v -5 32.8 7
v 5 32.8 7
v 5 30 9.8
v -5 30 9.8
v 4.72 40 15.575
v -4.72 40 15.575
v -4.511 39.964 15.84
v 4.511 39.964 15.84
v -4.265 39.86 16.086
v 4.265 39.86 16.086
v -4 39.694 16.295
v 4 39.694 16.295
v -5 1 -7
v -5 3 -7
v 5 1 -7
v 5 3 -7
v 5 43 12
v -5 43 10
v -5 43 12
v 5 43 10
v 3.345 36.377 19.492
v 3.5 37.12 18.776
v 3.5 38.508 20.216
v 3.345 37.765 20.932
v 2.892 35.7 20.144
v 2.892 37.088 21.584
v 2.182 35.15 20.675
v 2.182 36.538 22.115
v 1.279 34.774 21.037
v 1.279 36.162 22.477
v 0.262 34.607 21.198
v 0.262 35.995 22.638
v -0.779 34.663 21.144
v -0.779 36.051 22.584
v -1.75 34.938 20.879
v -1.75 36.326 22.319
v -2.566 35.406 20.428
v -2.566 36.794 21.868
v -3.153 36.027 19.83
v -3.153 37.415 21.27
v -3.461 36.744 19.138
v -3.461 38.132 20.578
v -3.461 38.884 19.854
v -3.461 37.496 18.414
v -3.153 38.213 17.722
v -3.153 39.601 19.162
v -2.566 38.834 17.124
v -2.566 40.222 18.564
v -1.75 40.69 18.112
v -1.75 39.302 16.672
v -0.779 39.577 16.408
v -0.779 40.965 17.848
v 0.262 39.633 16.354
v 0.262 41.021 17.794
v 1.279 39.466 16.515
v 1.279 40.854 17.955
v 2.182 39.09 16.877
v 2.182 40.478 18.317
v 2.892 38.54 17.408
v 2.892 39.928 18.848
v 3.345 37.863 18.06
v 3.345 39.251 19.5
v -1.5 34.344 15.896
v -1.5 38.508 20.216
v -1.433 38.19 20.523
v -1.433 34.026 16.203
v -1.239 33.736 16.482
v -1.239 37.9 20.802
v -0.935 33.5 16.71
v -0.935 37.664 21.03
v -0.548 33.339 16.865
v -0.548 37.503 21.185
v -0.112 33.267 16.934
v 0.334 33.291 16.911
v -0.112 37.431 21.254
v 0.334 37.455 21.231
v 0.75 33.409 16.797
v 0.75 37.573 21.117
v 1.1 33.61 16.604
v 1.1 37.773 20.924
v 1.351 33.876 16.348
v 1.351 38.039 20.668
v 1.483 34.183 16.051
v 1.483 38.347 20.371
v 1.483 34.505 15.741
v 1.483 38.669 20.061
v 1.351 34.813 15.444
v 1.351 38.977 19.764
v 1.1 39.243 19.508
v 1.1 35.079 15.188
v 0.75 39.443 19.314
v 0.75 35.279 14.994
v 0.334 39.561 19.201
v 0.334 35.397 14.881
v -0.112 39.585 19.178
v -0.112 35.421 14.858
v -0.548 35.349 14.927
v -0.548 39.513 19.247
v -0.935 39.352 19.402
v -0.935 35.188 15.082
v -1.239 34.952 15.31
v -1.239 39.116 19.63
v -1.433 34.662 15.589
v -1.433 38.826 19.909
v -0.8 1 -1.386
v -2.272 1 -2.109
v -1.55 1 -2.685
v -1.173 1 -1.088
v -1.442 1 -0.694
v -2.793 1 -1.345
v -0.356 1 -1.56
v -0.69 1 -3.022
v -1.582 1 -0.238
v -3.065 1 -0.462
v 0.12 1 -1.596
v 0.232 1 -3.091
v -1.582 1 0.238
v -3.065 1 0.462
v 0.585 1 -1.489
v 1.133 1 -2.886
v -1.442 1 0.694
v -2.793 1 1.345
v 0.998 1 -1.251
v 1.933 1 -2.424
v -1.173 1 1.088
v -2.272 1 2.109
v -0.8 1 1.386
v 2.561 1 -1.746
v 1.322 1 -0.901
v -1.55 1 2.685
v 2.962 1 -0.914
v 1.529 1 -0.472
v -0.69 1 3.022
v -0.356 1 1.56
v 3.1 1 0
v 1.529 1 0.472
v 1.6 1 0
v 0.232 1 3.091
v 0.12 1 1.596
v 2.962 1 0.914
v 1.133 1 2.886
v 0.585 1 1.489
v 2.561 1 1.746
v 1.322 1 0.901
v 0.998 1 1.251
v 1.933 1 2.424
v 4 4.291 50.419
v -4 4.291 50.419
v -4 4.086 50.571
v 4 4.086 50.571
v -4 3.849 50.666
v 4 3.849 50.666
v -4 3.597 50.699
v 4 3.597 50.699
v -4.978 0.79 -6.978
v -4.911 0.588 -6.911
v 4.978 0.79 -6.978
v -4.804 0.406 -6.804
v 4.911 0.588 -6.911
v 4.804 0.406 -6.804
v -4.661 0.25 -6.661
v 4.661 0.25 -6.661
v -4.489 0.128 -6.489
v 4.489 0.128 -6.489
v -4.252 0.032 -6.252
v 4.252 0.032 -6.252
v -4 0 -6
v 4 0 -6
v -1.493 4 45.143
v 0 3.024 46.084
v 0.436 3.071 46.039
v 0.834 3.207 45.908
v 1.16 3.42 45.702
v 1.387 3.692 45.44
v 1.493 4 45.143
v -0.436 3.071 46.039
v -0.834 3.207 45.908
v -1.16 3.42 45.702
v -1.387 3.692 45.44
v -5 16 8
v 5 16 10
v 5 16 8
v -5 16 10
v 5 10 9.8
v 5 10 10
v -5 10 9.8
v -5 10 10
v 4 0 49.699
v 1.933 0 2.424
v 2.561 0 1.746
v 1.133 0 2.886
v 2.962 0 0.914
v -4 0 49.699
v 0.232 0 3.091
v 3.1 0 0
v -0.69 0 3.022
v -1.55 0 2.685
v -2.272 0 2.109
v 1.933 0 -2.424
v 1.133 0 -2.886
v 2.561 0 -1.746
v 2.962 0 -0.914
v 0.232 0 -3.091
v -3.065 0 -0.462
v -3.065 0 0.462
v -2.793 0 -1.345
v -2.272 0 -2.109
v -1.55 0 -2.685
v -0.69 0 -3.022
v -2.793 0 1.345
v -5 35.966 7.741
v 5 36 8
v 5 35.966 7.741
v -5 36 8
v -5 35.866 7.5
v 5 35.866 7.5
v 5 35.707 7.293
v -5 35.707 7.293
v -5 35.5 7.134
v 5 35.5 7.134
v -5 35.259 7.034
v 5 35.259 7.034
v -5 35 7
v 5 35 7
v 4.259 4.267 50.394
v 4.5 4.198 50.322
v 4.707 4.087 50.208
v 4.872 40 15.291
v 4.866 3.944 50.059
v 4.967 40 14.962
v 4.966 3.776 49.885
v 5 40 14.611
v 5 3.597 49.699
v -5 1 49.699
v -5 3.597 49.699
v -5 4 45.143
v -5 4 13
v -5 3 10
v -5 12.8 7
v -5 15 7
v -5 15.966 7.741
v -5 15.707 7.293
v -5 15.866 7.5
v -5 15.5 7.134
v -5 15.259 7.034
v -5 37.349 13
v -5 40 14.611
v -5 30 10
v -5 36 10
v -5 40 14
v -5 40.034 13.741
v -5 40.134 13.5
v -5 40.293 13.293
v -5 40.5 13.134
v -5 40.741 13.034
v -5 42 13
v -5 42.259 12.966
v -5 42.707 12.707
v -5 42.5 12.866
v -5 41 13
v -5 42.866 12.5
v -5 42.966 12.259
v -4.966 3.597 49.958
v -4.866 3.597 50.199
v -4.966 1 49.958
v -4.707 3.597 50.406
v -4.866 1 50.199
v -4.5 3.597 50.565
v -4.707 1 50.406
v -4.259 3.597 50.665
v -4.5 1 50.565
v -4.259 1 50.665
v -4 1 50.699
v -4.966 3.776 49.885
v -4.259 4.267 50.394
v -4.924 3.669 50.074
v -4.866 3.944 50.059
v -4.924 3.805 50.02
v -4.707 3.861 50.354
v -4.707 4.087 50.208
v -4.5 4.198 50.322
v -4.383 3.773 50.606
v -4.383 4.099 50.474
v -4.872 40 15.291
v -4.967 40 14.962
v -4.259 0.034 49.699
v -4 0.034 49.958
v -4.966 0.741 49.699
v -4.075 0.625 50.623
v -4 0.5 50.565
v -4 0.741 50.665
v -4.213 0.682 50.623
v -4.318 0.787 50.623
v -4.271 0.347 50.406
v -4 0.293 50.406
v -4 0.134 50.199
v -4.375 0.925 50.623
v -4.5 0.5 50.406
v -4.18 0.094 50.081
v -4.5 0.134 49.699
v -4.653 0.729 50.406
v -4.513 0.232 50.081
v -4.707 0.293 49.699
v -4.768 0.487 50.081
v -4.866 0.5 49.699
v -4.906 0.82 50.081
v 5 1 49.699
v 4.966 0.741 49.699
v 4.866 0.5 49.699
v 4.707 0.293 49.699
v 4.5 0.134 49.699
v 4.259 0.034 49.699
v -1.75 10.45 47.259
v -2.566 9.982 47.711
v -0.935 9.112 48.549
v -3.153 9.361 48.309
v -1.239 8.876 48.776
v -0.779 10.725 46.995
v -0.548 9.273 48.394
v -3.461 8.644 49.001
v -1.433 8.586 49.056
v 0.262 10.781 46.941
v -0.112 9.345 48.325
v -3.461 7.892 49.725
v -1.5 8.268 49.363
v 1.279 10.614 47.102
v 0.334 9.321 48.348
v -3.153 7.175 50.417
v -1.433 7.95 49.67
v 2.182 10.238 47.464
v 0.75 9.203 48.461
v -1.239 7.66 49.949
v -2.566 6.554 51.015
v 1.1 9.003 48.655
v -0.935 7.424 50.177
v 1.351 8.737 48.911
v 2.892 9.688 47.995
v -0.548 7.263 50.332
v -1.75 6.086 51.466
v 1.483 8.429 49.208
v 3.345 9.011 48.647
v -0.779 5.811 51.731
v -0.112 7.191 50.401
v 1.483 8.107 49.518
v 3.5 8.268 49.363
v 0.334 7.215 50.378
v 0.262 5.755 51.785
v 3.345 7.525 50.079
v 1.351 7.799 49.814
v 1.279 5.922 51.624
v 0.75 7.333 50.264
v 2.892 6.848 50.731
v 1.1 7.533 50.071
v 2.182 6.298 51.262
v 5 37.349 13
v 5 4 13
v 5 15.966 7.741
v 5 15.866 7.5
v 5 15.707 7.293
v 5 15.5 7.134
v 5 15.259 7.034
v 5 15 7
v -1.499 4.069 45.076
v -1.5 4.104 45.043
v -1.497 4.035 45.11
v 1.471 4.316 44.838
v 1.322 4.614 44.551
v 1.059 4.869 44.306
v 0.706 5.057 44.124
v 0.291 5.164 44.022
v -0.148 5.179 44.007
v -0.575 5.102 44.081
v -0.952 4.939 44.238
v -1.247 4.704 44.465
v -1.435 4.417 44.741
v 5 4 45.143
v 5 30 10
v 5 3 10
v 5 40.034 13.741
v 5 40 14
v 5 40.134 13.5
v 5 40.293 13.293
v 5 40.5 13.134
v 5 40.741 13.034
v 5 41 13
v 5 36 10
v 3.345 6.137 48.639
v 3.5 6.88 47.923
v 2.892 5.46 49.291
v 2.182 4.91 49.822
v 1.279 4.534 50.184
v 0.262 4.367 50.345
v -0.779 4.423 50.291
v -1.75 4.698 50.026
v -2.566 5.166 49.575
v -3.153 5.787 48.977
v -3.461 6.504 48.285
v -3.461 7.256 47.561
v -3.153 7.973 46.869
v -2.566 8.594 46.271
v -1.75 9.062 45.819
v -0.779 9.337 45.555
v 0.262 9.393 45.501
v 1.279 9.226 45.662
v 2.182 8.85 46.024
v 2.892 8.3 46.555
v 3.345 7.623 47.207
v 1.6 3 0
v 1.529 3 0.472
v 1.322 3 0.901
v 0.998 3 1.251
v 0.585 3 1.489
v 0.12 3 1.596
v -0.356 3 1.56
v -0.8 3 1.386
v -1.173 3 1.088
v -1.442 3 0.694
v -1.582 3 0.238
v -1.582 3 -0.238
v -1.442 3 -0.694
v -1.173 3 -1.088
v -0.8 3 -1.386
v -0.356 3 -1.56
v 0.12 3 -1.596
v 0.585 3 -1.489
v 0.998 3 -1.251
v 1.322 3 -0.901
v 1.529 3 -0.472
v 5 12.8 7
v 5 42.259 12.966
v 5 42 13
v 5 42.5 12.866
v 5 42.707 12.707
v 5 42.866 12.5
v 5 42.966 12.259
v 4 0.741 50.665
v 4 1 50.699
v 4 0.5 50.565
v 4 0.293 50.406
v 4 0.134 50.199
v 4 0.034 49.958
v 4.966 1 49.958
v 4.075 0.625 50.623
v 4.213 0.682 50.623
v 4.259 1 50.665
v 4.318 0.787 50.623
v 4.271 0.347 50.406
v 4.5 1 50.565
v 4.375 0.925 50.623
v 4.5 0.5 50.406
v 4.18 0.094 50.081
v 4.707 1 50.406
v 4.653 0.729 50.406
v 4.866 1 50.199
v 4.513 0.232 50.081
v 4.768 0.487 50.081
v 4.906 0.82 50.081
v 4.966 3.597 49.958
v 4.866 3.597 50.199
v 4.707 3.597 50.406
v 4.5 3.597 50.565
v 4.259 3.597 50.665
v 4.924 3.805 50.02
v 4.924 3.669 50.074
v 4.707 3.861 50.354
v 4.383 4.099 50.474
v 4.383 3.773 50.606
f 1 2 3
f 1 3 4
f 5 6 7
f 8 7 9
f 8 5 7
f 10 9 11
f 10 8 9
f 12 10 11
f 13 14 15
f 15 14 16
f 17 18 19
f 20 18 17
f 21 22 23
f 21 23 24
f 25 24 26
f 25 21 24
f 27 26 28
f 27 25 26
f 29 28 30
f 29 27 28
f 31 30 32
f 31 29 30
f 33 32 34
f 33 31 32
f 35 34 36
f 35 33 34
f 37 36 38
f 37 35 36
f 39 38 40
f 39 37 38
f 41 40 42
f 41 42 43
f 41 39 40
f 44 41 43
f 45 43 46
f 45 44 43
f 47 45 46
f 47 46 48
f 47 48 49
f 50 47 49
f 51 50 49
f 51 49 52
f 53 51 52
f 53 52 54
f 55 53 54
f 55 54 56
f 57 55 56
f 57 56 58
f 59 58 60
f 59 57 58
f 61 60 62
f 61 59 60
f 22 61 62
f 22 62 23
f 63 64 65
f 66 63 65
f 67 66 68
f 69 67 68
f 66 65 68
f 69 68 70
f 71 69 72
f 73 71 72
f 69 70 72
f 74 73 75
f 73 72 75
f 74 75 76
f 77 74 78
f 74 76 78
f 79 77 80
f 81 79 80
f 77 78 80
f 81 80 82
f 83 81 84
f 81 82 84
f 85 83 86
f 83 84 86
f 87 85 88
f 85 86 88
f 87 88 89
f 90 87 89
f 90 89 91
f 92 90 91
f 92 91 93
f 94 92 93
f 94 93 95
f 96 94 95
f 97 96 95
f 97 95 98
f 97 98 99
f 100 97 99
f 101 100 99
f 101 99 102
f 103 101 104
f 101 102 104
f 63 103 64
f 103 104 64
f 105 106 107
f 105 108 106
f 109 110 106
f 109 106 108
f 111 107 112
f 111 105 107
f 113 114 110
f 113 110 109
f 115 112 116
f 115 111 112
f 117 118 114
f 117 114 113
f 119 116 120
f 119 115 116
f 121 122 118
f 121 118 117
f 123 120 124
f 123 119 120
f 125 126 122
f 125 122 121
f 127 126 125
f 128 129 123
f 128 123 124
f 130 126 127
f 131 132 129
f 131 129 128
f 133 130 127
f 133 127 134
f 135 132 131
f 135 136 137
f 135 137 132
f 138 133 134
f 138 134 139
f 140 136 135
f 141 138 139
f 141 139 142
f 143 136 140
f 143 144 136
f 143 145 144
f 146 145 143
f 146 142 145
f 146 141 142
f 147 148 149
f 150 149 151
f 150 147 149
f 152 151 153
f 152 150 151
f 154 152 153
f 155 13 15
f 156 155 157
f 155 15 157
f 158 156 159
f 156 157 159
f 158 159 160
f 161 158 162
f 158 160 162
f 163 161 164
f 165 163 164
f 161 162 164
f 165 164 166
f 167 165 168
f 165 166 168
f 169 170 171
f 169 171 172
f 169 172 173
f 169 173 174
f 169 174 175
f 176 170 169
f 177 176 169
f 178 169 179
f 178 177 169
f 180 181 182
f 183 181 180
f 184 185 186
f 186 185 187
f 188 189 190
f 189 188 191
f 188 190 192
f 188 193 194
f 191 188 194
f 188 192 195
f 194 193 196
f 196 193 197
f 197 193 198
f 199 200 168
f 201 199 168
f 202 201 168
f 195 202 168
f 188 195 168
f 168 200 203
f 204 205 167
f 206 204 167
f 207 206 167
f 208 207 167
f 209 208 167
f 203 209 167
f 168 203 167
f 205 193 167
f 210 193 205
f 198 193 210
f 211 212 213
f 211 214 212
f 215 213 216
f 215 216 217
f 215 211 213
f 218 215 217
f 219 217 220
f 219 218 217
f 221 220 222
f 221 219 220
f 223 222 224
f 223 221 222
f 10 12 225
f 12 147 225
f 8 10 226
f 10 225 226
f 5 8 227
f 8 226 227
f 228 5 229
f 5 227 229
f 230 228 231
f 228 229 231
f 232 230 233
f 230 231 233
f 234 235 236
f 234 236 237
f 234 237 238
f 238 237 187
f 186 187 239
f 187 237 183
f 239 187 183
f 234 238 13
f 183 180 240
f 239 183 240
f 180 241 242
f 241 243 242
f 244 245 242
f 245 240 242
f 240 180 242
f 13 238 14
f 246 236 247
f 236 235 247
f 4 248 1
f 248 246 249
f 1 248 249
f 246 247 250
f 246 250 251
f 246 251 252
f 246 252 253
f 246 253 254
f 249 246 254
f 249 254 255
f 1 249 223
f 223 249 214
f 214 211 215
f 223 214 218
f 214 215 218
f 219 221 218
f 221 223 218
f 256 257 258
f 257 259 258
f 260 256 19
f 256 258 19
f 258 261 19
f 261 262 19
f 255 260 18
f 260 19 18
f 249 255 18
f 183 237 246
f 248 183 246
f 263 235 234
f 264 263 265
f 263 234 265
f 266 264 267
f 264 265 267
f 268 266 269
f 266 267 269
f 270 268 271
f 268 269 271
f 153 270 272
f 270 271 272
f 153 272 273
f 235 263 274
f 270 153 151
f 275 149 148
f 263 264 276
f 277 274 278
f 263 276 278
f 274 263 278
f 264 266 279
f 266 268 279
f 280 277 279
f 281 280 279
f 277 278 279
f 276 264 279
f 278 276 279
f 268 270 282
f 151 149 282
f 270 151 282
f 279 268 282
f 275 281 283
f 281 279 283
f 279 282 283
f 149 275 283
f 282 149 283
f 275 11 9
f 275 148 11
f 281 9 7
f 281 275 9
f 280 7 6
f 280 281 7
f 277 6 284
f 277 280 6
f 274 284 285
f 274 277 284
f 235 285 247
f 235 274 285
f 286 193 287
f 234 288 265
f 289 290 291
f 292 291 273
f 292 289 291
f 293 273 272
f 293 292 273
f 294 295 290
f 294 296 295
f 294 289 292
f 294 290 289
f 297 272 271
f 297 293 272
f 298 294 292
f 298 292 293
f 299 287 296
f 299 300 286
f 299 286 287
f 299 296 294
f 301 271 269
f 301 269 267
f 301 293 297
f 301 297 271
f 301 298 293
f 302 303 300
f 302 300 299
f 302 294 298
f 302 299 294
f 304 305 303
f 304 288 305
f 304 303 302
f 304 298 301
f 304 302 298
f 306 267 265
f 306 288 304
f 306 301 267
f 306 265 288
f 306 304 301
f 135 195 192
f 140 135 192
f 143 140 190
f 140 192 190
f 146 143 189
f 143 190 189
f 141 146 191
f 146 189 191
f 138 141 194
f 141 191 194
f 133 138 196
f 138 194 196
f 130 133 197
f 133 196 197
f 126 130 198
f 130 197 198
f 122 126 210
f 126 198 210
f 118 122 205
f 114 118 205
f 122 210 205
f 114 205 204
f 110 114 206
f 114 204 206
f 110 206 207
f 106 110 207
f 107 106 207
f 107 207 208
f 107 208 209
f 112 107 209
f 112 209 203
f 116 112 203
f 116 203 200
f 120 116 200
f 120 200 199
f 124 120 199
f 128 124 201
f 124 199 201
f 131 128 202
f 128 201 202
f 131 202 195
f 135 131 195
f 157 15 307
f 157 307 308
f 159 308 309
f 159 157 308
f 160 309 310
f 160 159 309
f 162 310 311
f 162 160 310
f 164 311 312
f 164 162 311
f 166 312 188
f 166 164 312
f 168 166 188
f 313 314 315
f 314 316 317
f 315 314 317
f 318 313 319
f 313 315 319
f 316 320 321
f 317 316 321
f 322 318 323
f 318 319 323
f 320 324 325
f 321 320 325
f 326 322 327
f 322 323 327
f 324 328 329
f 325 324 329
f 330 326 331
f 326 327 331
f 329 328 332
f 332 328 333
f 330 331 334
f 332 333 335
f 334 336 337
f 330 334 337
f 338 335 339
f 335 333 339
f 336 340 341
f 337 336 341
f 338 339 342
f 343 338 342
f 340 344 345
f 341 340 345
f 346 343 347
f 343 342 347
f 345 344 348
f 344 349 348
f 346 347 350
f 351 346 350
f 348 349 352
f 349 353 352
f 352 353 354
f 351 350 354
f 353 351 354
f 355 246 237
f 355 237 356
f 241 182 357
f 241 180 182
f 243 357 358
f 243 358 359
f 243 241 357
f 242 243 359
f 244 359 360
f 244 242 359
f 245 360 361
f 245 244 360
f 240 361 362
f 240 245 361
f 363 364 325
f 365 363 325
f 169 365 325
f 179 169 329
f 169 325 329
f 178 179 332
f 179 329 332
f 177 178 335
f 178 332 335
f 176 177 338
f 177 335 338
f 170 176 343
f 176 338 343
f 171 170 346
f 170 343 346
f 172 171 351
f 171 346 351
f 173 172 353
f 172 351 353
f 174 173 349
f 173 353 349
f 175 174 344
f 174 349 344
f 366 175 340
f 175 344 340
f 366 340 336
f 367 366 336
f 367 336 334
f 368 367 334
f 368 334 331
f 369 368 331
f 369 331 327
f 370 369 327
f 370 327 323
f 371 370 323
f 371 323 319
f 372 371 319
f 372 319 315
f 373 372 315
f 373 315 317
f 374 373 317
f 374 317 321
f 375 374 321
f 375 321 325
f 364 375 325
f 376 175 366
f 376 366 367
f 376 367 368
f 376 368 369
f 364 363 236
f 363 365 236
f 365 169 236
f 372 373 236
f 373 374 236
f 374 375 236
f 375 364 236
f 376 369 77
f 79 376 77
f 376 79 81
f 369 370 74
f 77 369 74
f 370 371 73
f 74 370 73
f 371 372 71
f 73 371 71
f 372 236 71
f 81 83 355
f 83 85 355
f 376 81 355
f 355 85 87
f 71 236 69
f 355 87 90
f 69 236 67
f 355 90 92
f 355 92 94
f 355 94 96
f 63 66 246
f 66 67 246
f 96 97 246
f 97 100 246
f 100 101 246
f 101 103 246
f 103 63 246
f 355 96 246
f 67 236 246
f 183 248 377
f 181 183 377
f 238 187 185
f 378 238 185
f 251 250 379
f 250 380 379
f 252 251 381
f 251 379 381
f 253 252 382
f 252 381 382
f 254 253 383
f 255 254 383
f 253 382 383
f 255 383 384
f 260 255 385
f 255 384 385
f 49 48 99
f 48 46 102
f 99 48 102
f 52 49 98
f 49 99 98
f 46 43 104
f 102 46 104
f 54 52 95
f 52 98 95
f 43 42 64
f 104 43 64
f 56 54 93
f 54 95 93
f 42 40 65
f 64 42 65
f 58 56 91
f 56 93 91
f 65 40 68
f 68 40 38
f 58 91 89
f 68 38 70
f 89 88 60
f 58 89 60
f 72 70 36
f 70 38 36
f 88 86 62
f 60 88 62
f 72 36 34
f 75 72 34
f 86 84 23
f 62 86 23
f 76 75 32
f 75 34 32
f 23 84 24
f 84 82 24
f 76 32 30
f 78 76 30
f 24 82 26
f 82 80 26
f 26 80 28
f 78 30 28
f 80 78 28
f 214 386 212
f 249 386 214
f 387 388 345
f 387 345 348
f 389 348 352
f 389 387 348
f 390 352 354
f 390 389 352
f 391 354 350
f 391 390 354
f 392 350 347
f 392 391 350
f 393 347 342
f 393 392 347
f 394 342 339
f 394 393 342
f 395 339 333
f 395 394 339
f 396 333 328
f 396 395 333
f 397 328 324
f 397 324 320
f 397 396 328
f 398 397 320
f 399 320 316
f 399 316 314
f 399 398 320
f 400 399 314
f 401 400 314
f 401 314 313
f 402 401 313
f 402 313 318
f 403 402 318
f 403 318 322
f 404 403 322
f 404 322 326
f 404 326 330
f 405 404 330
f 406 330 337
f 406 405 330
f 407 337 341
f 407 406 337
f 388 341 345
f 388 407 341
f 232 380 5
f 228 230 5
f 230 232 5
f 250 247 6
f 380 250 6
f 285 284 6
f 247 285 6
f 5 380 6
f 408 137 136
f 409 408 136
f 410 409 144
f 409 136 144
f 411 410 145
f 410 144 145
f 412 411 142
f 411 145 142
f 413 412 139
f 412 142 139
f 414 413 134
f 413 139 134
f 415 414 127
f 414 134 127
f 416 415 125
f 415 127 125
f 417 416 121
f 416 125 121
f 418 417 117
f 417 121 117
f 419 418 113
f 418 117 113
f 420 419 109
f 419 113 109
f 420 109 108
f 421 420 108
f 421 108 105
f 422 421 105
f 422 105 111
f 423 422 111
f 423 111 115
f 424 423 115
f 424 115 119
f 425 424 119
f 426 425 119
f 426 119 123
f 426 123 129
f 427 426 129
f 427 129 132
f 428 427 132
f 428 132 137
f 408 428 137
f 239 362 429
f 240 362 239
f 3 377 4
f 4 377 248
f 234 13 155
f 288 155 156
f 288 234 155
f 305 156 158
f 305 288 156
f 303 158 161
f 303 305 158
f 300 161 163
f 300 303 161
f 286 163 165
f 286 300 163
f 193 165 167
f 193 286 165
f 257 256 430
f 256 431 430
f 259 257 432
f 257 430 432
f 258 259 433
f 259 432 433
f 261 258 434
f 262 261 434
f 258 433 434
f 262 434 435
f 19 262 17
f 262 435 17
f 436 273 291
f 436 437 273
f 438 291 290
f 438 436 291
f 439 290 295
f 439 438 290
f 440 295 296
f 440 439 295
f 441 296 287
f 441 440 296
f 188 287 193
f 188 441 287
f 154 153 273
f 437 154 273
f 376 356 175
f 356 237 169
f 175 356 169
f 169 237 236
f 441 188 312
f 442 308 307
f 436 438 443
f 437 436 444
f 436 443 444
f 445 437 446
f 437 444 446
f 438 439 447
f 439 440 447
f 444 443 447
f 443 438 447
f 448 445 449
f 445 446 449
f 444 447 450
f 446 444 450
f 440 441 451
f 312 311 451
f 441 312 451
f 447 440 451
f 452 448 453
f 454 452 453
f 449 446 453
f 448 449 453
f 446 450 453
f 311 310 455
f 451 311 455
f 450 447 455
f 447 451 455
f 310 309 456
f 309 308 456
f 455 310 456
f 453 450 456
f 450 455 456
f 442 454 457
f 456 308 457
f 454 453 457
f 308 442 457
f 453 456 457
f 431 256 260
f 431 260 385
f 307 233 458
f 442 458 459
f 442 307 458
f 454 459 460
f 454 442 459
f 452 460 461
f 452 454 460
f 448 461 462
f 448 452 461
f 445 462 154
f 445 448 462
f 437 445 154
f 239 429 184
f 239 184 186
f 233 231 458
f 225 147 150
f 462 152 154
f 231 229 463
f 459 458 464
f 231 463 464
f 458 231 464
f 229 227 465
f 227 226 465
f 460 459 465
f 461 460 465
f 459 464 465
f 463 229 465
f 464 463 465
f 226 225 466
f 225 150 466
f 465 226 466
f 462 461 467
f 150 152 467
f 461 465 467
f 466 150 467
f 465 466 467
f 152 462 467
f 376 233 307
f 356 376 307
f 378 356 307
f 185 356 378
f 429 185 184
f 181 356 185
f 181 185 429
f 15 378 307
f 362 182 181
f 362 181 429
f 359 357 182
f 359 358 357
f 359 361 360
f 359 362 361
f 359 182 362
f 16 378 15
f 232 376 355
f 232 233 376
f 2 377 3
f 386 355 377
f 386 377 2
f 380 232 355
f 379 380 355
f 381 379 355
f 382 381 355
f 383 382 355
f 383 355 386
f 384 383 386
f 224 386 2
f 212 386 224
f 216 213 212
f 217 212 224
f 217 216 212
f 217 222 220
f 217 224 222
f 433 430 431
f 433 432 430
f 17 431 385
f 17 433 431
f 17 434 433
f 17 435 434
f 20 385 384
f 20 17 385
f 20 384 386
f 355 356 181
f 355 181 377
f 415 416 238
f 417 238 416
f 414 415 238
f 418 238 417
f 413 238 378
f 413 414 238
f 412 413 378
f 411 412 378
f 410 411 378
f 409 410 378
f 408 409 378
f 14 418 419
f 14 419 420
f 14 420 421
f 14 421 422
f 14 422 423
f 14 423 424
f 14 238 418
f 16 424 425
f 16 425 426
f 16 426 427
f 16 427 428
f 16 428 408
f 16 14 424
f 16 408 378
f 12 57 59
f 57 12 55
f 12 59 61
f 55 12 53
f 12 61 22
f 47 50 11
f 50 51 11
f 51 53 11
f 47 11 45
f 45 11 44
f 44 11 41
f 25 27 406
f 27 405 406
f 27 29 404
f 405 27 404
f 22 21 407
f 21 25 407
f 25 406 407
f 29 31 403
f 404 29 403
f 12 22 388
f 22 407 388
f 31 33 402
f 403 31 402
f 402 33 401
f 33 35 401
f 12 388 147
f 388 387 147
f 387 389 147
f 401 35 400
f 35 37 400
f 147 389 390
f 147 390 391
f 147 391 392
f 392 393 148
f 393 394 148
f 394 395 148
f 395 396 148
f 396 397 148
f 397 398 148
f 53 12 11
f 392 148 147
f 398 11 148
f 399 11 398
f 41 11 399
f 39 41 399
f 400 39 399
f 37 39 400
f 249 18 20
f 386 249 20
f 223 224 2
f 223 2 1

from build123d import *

# Parameters (mm, degrees)
SKETCH1_W           = 10
SKETCH1_H           = 20
BOSS_EXTRUDE1_DEPTH = 3
SKETCH2_R           = 1.6
CUT_EXTRUDE1_DEPTH  = 4
SKETCH3_R           = 3.1
CUT_EXTRUDE2_DEPTH  = 1
SKETCH4_W           = 10
SKETCH4_H           = 43
BOSS_EXTRUDE2_DEPTH = 3
SKETCH5_W           = 10
SKETCH5_H           = 6
BOSS_EXTRUDE3_DEPTH = 3
CHAMFER1_SIZE       = 2.8
BOSS_EXTRUDE4_DEPTH = 10
SKETCH7_R           = 3.5
BOSS_EXTRUDE5_DEPTH = 2
SKETCH10_W          = 10
SKETCH10_H          = 3
CUT_EXTRUDE6_DEPTH  = 4
FILLET2_R           = 1
SKETCH8_R           = 1.5
CUT_EXTRUDE4_DEPTH  = 6


with BuildPart() as part:
    # Sketch1 → Boss-Extrude1 (new body)
    with BuildSketch(Plane(origin=(0, 0, 0), x_dir=(1, 0, 0), z_dir=(0, 1, 0))):
        Rectangle(SKETCH1_W, SKETCH1_H)
    extrude(amount=BOSS_EXTRUDE1_DEPTH)

    # Sketch2 → Cut-Extrude1 (cut, through all)
    with BuildSketch(Plane.XZ):
        Circle(SKETCH2_R)
    extrude(amount=-CUT_EXTRUDE1_DEPTH, mode=Mode.SUBTRACT)

    # Sketch3 → Cut-Extrude2 (cut)
    with BuildSketch(Plane.XZ):
        Circle(SKETCH3_R)
    extrude(amount=-CUT_EXTRUDE2_DEPTH, mode=Mode.SUBTRACT)

    # Sketch4 → Boss-Extrude2 (add)
    with BuildSketch(Plane.XY.offset(10)):
        with Locations((0, 21.5)):
            Rectangle(SKETCH4_W, SKETCH4_H)
    extrude(amount=BOSS_EXTRUDE2_DEPTH)

    # Sketch5 → Boss-Extrude3 (add)
    with BuildSketch(Plane(origin=(0, 0, 10), x_dir=(-1, 0, 0), z_dir=(0, 0, -1))):
        with Locations((0, 13)):
            Rectangle(SKETCH5_W, SKETCH5_H)
        with Locations((0, 33)):
            Rectangle(SKETCH5_W, SKETCH5_H)
    extrude(amount=BOSS_EXTRUDE3_DEPTH)

    # Chamfer1
    chamfer1_edges = [part.edges().sort_by_distance(p)[0] for p in [
        (0, 30, 7),
        (0, 10, 7),
    ]]
    chamfer(chamfer1_edges, length=CHAMFER1_SIZE)

    # Sketch6 → Boss-Extrude4 (add)
    with BuildSketch(Plane.ZY.offset(5)):
        Polygon((13, 40), (16, 40), (50.698703146, 4), (50.698703146, 0), (13, 0), (13, 4), (45.14314759, 4), (13, 37.348604079), align=None)
    extrude(amount=-BOSS_EXTRUDE4_DEPTH)

    # Sketch7 → Boss-Extrude5 (add)
    with BuildSketch(Plane(origin=(0, -24.3220742, 77.997015511), x_dir=(1, 0, 0), z_dir=(0, -0.693974063, -0.72))):
        with Locations((0, -43.336214167)):
            Circle(SKETCH7_R)
        with Locations((0, -85.336214167)):
            Circle(SKETCH7_R)
    extrude(amount=-BOSS_EXTRUDE5_DEPTH)

    # Sketch10 → Cut-Extrude6 (cut, through all)
    with BuildSketch(Plane(origin=(0, 3, 0), x_dir=(1, 0, 0), z_dir=(0, 1, 0))):
        with Locations((0, 8.5)):
            Rectangle(SKETCH10_W, SKETCH10_H)
    extrude(amount=-CUT_EXTRUDE6_DEPTH, mode=Mode.SUBTRACT)

    # Fillet2
    fillet2_edges = [part.edges().sort_by_distance(p)[0] for p in [
        (-5, 0, 21.849351573),
        (0, 0, -7),
        (0, 43, 13),
        (0, 36, 7),
        (5, 0, 21.849351573),
        (0, 16, 7),
        (0, 40, 13),
        (0, 40, 16),
        (0, 4, 50.698703146),
        (0, 0, 50.698703146),
        (-5, 2, 50.698703146),
        (-5, 22, 33.349351573),
        (5, 22, 33.349351573),
        (5, 2, 50.698703146),
    ]]
    fillet(fillet2_edges, radius=FILLET2_R)

    # Sketch8 → Cut-Extrude4 (cut)
    with BuildSketch(Plane(origin=(0, 28.646529331, 29.720853012), x_dir=(-1, 0, 0), z_dir=(0, 0.693974063, 0.72))):
        with Locations((0, 28.303585007)):
            Circle(SKETCH8_R)
        with Locations((0, -13.696414993)):
            Circle(SKETCH8_R)
    extrude(amount=-CUT_EXTRUDE4_DEPTH, mode=Mode.SUBTRACT)


solid = part.part
